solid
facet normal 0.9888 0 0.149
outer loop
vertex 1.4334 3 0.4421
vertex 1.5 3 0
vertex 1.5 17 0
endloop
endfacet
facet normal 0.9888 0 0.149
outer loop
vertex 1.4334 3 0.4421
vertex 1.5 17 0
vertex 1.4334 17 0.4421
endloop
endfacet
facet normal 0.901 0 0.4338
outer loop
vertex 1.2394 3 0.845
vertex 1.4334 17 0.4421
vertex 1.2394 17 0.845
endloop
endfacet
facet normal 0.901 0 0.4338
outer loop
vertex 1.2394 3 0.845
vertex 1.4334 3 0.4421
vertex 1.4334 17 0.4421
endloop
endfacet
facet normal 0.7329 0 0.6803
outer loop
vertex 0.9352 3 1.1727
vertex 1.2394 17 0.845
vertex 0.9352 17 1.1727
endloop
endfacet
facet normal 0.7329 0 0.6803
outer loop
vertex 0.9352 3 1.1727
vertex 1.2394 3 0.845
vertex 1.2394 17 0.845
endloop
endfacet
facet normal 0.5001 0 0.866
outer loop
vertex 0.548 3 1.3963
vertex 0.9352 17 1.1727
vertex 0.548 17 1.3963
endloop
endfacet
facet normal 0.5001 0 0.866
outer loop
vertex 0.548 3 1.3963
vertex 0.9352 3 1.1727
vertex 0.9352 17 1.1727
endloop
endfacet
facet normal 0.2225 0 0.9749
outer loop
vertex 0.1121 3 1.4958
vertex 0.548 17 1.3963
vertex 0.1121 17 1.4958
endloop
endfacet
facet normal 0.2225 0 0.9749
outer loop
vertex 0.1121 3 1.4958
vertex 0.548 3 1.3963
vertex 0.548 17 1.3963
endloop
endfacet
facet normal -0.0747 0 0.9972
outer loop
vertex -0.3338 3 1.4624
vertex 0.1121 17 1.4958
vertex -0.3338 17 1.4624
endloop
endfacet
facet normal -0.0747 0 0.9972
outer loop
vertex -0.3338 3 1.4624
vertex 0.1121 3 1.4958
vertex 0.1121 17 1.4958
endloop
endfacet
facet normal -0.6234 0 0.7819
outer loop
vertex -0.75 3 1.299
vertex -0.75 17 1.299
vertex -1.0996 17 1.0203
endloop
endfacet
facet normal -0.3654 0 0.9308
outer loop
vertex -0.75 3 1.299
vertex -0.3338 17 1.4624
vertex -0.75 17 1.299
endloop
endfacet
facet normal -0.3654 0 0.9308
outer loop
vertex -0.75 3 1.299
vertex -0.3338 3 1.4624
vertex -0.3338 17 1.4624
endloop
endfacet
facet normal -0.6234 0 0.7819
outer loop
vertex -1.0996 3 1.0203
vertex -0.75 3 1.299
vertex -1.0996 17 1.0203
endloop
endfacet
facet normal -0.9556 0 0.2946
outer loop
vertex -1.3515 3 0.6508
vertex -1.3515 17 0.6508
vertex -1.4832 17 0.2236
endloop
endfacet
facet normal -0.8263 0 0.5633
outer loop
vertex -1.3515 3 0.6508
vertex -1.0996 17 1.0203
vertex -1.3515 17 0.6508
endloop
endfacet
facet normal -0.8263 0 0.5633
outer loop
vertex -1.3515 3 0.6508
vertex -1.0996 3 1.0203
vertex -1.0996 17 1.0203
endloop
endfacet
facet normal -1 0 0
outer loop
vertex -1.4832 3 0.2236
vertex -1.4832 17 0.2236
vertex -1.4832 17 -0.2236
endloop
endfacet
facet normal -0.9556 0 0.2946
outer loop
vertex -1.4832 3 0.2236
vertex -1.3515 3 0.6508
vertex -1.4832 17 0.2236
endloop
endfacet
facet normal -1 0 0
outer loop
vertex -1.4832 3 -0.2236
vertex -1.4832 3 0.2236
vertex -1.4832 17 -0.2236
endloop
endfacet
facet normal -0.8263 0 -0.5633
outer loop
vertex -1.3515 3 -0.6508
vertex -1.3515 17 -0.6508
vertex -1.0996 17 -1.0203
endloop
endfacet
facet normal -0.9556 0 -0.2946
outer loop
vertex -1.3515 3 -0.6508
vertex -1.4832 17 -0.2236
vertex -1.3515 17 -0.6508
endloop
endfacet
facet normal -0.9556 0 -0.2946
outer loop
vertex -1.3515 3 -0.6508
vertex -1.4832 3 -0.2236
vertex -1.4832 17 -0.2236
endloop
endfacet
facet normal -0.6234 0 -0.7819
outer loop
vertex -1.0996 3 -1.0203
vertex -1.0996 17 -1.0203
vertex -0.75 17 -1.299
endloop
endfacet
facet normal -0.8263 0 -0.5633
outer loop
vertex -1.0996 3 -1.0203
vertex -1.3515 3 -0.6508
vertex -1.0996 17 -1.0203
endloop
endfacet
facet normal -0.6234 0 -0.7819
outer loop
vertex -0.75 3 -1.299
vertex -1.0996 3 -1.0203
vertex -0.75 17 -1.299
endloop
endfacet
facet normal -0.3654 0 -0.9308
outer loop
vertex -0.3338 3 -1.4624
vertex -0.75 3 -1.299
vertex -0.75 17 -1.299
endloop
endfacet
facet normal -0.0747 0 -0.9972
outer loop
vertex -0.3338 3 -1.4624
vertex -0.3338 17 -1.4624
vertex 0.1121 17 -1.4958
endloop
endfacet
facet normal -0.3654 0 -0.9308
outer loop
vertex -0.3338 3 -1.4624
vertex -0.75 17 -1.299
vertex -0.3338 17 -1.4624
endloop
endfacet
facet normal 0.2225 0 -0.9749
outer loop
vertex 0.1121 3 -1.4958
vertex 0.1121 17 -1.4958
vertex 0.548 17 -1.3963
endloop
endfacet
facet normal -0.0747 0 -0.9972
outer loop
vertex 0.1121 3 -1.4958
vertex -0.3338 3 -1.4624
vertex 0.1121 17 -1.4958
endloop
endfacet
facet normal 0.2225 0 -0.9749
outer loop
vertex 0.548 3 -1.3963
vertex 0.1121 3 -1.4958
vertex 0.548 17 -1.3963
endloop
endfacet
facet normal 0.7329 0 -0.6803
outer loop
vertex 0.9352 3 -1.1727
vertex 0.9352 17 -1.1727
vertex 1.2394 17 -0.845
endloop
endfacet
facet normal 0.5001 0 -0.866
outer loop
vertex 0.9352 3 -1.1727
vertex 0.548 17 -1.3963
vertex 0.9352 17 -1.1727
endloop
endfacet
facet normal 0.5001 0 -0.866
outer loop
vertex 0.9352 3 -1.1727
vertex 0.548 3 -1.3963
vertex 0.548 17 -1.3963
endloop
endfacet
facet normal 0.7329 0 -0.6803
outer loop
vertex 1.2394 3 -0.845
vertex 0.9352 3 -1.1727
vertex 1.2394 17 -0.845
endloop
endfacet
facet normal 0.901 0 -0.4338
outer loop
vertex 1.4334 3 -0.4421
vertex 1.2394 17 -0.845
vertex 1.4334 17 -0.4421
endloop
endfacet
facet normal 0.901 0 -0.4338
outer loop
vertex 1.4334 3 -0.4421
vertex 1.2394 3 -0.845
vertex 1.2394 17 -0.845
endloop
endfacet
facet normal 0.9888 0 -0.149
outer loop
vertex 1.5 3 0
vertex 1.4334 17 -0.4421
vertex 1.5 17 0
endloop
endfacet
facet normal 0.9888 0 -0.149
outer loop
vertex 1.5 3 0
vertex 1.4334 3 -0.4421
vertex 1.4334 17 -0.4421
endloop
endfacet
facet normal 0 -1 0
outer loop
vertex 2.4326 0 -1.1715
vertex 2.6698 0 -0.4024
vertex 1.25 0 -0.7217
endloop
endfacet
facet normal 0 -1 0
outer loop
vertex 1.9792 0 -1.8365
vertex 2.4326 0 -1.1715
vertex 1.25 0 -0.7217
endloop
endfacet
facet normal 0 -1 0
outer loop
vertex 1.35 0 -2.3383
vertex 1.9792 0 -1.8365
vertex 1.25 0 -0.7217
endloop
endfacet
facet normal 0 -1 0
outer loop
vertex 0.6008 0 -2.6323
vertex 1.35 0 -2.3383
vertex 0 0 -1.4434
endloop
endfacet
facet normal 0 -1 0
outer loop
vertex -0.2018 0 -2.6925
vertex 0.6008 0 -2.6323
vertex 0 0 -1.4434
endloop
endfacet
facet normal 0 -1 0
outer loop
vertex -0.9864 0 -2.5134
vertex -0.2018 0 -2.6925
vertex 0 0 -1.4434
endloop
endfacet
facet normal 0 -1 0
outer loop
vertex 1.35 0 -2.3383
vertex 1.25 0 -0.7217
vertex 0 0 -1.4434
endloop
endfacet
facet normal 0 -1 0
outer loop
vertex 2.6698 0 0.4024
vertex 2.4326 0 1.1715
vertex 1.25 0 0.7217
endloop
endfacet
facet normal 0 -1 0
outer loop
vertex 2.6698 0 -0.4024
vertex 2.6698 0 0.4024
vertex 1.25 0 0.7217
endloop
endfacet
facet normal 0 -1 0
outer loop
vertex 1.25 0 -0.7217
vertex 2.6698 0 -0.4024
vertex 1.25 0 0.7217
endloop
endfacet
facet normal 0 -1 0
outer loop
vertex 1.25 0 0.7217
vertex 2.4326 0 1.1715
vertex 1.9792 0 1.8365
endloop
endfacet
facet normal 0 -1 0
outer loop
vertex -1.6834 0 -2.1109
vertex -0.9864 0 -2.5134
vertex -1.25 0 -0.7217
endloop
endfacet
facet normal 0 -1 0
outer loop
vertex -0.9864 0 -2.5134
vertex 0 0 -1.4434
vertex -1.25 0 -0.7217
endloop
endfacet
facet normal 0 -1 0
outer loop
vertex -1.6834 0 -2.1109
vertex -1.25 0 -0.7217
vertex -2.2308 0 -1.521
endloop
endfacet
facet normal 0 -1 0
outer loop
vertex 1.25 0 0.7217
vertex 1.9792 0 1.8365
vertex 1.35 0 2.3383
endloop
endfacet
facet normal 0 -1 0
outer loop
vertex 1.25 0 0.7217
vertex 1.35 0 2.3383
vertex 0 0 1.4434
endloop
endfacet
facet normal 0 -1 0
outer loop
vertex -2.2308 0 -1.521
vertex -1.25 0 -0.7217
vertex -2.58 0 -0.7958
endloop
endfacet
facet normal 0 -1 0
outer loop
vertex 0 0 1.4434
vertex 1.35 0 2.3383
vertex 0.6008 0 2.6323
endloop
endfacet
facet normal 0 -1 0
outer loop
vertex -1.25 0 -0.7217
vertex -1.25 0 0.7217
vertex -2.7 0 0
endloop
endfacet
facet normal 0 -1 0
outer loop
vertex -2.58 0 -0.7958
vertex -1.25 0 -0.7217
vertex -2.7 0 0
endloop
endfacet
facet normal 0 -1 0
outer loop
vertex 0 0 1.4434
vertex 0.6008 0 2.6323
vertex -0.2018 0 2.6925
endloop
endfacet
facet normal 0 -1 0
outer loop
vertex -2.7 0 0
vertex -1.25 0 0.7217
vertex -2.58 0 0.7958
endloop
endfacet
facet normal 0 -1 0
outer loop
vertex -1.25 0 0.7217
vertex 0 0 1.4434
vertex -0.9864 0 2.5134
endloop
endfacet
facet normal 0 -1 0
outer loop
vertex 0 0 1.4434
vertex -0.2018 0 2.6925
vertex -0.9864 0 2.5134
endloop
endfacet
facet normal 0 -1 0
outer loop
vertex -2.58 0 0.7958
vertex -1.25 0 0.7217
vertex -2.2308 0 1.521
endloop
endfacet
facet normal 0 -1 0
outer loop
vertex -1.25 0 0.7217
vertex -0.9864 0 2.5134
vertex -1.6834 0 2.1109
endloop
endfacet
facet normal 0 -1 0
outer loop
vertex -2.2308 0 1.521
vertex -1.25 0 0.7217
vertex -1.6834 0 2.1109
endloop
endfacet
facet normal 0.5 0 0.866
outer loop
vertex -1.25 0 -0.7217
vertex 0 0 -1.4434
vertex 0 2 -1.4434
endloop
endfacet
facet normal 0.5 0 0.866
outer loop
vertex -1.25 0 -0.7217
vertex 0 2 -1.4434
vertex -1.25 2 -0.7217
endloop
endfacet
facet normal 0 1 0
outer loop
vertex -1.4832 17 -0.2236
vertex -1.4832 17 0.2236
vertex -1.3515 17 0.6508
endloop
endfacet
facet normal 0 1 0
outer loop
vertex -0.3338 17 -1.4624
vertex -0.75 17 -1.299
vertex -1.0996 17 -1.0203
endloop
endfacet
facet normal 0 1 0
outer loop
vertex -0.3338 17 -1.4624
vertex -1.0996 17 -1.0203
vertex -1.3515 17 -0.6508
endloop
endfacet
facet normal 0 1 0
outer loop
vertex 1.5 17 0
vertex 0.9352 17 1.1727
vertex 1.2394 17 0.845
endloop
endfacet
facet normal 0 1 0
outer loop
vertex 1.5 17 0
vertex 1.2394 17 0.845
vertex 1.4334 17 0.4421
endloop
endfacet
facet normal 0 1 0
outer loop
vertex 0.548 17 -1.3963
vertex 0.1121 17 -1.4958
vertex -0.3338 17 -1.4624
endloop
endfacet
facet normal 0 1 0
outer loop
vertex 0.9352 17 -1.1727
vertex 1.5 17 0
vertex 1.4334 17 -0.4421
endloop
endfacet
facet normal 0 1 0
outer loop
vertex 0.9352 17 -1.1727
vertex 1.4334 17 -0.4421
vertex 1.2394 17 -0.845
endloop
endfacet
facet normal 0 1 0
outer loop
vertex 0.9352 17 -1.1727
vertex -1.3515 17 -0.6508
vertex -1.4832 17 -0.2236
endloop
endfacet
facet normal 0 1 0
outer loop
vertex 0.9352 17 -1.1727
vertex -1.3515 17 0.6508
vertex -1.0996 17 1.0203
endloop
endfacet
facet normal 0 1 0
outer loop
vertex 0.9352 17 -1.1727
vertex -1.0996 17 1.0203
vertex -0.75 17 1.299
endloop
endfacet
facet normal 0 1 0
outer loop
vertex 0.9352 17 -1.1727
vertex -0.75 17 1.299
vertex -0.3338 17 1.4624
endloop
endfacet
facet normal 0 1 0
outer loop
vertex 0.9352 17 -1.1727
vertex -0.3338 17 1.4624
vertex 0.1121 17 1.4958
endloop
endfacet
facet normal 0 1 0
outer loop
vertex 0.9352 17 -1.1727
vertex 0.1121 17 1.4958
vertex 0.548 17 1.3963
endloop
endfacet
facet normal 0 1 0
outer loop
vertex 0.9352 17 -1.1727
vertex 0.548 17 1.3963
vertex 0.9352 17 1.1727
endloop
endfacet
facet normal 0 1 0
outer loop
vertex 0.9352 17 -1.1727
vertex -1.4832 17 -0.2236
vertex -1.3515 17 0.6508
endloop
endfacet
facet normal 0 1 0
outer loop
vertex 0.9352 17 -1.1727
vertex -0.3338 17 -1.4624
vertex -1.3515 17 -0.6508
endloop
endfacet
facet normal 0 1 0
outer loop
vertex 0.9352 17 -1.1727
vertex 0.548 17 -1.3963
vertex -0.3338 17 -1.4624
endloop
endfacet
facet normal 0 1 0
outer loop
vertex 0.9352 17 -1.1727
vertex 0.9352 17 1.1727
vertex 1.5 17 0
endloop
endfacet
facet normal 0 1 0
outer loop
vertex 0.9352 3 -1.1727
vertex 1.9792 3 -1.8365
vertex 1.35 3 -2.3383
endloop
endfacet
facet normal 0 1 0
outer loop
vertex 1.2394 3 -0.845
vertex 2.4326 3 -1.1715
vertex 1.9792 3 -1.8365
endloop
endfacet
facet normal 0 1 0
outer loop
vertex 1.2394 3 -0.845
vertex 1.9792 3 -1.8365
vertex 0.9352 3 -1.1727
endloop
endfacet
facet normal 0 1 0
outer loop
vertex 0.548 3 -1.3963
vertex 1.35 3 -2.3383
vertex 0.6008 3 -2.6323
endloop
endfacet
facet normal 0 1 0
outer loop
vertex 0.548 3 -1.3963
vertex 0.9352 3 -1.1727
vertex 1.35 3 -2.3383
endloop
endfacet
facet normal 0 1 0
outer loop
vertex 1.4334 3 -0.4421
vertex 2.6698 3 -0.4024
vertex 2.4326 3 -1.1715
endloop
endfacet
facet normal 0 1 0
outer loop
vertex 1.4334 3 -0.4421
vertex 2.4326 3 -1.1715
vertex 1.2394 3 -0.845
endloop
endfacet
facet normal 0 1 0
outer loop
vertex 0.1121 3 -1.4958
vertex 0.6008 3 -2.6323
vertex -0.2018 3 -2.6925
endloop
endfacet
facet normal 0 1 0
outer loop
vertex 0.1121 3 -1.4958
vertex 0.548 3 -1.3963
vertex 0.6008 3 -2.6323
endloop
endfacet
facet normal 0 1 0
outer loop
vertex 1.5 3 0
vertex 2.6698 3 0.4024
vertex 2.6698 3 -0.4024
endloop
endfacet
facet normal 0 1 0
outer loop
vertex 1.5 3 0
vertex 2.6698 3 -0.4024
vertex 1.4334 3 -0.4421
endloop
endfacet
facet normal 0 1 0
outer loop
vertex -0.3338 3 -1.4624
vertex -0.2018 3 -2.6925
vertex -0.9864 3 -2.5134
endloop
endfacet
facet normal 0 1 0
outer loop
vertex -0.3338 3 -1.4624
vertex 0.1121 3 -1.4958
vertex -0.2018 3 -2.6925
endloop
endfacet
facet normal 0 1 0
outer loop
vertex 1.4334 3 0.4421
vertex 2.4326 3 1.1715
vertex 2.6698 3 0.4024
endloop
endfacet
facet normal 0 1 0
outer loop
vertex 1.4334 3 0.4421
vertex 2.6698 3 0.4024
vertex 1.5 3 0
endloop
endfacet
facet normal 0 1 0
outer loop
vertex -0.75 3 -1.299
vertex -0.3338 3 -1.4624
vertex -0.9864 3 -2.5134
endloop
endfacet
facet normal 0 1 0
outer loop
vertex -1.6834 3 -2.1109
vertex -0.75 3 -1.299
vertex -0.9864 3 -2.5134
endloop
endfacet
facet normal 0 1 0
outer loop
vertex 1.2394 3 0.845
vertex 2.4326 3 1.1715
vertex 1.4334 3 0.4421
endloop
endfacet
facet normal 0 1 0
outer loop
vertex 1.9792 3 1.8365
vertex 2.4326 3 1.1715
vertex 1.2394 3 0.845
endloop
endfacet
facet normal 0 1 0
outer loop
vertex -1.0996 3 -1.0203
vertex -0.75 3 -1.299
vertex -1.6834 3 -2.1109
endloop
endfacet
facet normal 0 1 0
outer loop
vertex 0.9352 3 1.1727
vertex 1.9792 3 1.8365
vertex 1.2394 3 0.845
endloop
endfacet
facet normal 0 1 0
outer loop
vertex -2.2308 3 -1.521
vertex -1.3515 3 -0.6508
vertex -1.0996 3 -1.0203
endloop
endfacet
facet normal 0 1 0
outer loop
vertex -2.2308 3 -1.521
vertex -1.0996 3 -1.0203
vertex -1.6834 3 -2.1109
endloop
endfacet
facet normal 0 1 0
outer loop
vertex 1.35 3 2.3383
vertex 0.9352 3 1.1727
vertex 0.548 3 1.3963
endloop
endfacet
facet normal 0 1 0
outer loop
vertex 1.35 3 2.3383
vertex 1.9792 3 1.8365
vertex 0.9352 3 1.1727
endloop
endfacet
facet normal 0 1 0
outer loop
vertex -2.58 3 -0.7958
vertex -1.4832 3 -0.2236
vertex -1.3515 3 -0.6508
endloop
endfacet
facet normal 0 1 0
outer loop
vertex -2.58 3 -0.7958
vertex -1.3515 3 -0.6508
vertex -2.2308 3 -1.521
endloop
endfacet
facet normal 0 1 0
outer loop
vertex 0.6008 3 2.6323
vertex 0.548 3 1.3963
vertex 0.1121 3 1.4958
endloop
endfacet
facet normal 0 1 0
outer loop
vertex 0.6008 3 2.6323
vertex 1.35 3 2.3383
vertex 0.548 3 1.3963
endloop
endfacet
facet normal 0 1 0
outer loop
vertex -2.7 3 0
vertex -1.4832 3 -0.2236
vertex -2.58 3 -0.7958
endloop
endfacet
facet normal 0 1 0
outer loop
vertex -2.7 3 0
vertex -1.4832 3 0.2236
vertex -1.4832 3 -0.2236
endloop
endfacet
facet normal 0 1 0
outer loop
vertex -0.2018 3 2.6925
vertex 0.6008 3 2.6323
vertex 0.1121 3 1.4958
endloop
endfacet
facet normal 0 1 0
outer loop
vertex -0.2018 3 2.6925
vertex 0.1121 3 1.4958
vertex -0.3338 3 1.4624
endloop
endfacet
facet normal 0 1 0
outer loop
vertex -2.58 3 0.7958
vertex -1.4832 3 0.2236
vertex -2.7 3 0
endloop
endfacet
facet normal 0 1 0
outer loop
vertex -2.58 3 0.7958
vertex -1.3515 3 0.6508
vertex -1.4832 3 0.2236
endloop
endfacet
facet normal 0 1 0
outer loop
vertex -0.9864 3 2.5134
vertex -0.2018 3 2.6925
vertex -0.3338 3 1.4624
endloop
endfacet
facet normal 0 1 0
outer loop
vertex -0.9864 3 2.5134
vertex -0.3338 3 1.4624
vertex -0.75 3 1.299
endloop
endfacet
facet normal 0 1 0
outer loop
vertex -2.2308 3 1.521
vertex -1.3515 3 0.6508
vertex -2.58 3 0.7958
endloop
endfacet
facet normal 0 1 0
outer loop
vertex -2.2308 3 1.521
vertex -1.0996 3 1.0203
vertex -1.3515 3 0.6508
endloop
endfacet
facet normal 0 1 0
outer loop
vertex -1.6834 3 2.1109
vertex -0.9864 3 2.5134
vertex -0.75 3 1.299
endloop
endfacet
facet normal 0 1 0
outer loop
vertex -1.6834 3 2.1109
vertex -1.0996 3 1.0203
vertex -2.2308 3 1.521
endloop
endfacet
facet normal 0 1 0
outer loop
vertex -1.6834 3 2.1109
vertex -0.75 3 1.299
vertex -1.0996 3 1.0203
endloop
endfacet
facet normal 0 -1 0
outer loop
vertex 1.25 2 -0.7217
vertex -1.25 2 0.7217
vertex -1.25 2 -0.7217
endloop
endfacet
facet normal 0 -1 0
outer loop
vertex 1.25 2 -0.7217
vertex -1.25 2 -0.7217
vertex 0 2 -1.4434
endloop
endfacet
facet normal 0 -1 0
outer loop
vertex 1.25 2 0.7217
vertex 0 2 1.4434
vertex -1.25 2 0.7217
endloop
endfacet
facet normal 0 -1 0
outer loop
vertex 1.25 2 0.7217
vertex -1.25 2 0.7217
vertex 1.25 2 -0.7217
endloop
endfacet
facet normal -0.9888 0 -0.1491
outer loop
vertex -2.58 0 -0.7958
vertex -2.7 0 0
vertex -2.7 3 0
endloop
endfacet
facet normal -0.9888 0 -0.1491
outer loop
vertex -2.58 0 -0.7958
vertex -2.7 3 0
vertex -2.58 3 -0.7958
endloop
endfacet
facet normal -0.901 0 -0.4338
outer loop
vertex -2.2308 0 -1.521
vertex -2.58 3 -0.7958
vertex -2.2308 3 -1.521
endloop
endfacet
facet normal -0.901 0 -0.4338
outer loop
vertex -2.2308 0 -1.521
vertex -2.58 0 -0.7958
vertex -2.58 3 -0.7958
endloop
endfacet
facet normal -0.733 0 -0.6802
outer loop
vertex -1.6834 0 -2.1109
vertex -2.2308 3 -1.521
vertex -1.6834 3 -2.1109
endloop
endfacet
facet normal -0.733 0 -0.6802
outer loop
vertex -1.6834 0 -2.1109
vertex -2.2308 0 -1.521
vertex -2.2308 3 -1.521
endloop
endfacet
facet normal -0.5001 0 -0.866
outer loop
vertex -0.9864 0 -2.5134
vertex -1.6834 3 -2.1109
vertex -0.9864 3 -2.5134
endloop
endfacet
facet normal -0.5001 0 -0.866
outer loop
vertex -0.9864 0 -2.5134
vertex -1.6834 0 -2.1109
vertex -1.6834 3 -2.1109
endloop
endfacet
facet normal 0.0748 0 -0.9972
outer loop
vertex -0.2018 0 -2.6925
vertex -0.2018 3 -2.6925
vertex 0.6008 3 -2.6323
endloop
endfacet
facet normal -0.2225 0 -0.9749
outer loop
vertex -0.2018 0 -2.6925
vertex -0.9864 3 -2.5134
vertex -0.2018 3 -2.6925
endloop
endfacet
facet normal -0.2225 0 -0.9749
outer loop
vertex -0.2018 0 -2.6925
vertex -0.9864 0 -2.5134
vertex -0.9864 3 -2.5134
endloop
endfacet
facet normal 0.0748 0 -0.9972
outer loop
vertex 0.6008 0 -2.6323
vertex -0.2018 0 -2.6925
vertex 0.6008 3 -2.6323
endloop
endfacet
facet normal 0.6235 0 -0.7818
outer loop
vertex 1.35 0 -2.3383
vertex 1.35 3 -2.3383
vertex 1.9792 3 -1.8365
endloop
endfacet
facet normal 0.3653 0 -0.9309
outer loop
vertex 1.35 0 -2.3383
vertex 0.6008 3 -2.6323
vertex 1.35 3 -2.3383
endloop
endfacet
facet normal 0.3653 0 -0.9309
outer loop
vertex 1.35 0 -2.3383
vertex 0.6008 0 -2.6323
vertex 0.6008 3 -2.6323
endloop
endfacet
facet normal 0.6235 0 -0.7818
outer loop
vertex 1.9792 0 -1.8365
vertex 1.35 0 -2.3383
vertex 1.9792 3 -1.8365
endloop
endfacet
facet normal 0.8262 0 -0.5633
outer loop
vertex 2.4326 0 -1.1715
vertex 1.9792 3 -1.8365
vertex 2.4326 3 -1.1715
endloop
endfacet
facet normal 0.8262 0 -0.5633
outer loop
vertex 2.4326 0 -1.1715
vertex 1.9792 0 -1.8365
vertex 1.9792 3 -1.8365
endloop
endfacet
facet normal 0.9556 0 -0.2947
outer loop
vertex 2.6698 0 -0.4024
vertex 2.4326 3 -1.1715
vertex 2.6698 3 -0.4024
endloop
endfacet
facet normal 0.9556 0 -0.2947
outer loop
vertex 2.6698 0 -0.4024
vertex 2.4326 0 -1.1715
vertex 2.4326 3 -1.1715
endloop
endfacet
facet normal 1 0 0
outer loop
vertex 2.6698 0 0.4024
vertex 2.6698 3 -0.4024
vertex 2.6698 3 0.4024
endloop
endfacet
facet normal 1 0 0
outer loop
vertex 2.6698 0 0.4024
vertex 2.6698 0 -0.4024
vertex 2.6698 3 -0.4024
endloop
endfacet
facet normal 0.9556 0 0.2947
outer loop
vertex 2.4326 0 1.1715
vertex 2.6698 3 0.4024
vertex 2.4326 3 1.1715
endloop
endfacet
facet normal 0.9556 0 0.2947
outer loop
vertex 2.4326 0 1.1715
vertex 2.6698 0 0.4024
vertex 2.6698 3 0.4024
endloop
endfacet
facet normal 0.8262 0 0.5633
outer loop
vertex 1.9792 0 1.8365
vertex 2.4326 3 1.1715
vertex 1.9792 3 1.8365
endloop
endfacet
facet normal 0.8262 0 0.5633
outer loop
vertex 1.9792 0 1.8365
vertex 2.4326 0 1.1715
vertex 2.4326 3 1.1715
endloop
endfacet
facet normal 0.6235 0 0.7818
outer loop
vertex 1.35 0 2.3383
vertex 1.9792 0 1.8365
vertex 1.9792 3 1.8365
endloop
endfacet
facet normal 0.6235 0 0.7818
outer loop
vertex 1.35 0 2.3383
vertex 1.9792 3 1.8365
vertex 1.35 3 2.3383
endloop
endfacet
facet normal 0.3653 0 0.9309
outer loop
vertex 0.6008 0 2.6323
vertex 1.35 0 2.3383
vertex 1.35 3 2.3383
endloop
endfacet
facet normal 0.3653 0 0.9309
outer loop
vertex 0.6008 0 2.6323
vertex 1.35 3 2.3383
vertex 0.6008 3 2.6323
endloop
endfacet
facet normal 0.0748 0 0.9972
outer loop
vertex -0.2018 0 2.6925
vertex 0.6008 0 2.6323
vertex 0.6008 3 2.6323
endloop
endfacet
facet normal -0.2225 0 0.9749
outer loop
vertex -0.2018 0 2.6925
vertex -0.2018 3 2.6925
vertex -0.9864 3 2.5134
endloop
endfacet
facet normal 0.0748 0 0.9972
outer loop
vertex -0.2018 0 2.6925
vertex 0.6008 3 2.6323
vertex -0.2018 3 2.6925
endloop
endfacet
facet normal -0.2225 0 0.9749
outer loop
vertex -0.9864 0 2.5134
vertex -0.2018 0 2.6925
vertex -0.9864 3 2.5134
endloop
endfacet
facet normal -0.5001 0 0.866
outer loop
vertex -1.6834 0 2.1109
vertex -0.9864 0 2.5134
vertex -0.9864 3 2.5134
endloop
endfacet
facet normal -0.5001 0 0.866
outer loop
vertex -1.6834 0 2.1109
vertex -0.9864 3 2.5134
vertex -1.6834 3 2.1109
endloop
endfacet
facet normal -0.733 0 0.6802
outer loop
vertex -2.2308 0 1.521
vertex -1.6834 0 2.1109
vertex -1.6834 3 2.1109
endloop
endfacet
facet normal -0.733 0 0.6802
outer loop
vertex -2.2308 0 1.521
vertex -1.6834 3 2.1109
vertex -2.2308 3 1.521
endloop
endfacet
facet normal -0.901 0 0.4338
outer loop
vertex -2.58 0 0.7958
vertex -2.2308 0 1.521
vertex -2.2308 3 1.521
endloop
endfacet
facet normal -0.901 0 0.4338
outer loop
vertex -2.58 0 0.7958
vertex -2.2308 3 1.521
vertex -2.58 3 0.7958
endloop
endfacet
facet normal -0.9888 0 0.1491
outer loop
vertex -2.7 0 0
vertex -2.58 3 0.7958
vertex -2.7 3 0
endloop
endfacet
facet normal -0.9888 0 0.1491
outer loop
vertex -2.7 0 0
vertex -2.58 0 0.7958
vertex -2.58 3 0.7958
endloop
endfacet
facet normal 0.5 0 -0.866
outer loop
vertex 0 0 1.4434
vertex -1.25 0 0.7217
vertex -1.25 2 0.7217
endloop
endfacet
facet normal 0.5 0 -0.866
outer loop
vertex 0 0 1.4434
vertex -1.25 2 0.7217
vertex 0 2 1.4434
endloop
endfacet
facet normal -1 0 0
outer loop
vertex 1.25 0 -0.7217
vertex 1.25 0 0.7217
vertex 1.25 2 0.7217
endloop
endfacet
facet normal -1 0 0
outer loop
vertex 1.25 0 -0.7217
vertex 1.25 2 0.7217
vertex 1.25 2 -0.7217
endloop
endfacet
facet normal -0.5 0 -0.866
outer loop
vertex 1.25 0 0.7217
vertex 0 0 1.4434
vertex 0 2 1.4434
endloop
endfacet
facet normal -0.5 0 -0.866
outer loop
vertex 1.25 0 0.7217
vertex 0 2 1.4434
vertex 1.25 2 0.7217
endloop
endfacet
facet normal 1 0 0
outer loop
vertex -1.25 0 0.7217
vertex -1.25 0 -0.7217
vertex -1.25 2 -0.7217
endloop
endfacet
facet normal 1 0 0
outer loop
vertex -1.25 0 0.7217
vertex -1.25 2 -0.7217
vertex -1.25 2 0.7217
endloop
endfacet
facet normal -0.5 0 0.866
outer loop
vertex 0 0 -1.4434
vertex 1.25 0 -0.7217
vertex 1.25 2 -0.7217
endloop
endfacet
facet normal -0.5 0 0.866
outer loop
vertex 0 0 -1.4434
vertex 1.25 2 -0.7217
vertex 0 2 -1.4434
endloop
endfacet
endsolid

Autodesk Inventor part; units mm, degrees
ref_plane "YZ Plane" through (0, 0, 0) normal (1, 0, 0) x (0, 1, 0)
ref_plane "XZ Plane" through (0, 0, 0) normal (0, 1, 0) x (-1, 0, 0)
ref_plane "XY Plane" through (0, 0, 0) normal (0, 0, 1) x (1, 0, 0)
sketch "Sketch1" plane through (0, 0, 0) normal (0, 1, 0) x (-1, 0, 0)
  circle A0 centre (0, 0) radius 2.7
  dimension "d0" = 5.4
extrude "Extrusion1" add sketch "Sketch1" along normal blind 3
sketch "Sketch2" plane through (0, 3, 0) normal (0, 1, 0) x (1, 0, 0)
  circle A0 centre (0, 0) radius 1.5
  dimension "d3" = 3
extrude "Extrusion2" add sketch "Sketch2" along normal blind 14
sketch "Sketch3" plane through (0, 0, 0) normal (0, -1, 0) x (1, 0, 0)
  line L0 (0, -1.4434) -> (-1.25, -0.7217)
  line L1 (-1.25, -0.7217) -> (-1.25, 0.7217)
  line L2 (-1.25, 0.7217) -> (0, 1.4434)
  line L3 (0, 1.4434) -> (1.25, 0.7217)
  line L4 (1.25, 0.7217) -> (1.25, -0.7217)
  line L5 (1.25, -0.7217) -> (0, -1.4434)
  point P0 (0, 0)
  point P1 (0, 0)
  dimension "d6" = 2.5
extrude "Extrusion3" cut sketch "Sketch3" against normal blind 2
properties part number "m3_bolt_14mm" material "Stainless Steel"
